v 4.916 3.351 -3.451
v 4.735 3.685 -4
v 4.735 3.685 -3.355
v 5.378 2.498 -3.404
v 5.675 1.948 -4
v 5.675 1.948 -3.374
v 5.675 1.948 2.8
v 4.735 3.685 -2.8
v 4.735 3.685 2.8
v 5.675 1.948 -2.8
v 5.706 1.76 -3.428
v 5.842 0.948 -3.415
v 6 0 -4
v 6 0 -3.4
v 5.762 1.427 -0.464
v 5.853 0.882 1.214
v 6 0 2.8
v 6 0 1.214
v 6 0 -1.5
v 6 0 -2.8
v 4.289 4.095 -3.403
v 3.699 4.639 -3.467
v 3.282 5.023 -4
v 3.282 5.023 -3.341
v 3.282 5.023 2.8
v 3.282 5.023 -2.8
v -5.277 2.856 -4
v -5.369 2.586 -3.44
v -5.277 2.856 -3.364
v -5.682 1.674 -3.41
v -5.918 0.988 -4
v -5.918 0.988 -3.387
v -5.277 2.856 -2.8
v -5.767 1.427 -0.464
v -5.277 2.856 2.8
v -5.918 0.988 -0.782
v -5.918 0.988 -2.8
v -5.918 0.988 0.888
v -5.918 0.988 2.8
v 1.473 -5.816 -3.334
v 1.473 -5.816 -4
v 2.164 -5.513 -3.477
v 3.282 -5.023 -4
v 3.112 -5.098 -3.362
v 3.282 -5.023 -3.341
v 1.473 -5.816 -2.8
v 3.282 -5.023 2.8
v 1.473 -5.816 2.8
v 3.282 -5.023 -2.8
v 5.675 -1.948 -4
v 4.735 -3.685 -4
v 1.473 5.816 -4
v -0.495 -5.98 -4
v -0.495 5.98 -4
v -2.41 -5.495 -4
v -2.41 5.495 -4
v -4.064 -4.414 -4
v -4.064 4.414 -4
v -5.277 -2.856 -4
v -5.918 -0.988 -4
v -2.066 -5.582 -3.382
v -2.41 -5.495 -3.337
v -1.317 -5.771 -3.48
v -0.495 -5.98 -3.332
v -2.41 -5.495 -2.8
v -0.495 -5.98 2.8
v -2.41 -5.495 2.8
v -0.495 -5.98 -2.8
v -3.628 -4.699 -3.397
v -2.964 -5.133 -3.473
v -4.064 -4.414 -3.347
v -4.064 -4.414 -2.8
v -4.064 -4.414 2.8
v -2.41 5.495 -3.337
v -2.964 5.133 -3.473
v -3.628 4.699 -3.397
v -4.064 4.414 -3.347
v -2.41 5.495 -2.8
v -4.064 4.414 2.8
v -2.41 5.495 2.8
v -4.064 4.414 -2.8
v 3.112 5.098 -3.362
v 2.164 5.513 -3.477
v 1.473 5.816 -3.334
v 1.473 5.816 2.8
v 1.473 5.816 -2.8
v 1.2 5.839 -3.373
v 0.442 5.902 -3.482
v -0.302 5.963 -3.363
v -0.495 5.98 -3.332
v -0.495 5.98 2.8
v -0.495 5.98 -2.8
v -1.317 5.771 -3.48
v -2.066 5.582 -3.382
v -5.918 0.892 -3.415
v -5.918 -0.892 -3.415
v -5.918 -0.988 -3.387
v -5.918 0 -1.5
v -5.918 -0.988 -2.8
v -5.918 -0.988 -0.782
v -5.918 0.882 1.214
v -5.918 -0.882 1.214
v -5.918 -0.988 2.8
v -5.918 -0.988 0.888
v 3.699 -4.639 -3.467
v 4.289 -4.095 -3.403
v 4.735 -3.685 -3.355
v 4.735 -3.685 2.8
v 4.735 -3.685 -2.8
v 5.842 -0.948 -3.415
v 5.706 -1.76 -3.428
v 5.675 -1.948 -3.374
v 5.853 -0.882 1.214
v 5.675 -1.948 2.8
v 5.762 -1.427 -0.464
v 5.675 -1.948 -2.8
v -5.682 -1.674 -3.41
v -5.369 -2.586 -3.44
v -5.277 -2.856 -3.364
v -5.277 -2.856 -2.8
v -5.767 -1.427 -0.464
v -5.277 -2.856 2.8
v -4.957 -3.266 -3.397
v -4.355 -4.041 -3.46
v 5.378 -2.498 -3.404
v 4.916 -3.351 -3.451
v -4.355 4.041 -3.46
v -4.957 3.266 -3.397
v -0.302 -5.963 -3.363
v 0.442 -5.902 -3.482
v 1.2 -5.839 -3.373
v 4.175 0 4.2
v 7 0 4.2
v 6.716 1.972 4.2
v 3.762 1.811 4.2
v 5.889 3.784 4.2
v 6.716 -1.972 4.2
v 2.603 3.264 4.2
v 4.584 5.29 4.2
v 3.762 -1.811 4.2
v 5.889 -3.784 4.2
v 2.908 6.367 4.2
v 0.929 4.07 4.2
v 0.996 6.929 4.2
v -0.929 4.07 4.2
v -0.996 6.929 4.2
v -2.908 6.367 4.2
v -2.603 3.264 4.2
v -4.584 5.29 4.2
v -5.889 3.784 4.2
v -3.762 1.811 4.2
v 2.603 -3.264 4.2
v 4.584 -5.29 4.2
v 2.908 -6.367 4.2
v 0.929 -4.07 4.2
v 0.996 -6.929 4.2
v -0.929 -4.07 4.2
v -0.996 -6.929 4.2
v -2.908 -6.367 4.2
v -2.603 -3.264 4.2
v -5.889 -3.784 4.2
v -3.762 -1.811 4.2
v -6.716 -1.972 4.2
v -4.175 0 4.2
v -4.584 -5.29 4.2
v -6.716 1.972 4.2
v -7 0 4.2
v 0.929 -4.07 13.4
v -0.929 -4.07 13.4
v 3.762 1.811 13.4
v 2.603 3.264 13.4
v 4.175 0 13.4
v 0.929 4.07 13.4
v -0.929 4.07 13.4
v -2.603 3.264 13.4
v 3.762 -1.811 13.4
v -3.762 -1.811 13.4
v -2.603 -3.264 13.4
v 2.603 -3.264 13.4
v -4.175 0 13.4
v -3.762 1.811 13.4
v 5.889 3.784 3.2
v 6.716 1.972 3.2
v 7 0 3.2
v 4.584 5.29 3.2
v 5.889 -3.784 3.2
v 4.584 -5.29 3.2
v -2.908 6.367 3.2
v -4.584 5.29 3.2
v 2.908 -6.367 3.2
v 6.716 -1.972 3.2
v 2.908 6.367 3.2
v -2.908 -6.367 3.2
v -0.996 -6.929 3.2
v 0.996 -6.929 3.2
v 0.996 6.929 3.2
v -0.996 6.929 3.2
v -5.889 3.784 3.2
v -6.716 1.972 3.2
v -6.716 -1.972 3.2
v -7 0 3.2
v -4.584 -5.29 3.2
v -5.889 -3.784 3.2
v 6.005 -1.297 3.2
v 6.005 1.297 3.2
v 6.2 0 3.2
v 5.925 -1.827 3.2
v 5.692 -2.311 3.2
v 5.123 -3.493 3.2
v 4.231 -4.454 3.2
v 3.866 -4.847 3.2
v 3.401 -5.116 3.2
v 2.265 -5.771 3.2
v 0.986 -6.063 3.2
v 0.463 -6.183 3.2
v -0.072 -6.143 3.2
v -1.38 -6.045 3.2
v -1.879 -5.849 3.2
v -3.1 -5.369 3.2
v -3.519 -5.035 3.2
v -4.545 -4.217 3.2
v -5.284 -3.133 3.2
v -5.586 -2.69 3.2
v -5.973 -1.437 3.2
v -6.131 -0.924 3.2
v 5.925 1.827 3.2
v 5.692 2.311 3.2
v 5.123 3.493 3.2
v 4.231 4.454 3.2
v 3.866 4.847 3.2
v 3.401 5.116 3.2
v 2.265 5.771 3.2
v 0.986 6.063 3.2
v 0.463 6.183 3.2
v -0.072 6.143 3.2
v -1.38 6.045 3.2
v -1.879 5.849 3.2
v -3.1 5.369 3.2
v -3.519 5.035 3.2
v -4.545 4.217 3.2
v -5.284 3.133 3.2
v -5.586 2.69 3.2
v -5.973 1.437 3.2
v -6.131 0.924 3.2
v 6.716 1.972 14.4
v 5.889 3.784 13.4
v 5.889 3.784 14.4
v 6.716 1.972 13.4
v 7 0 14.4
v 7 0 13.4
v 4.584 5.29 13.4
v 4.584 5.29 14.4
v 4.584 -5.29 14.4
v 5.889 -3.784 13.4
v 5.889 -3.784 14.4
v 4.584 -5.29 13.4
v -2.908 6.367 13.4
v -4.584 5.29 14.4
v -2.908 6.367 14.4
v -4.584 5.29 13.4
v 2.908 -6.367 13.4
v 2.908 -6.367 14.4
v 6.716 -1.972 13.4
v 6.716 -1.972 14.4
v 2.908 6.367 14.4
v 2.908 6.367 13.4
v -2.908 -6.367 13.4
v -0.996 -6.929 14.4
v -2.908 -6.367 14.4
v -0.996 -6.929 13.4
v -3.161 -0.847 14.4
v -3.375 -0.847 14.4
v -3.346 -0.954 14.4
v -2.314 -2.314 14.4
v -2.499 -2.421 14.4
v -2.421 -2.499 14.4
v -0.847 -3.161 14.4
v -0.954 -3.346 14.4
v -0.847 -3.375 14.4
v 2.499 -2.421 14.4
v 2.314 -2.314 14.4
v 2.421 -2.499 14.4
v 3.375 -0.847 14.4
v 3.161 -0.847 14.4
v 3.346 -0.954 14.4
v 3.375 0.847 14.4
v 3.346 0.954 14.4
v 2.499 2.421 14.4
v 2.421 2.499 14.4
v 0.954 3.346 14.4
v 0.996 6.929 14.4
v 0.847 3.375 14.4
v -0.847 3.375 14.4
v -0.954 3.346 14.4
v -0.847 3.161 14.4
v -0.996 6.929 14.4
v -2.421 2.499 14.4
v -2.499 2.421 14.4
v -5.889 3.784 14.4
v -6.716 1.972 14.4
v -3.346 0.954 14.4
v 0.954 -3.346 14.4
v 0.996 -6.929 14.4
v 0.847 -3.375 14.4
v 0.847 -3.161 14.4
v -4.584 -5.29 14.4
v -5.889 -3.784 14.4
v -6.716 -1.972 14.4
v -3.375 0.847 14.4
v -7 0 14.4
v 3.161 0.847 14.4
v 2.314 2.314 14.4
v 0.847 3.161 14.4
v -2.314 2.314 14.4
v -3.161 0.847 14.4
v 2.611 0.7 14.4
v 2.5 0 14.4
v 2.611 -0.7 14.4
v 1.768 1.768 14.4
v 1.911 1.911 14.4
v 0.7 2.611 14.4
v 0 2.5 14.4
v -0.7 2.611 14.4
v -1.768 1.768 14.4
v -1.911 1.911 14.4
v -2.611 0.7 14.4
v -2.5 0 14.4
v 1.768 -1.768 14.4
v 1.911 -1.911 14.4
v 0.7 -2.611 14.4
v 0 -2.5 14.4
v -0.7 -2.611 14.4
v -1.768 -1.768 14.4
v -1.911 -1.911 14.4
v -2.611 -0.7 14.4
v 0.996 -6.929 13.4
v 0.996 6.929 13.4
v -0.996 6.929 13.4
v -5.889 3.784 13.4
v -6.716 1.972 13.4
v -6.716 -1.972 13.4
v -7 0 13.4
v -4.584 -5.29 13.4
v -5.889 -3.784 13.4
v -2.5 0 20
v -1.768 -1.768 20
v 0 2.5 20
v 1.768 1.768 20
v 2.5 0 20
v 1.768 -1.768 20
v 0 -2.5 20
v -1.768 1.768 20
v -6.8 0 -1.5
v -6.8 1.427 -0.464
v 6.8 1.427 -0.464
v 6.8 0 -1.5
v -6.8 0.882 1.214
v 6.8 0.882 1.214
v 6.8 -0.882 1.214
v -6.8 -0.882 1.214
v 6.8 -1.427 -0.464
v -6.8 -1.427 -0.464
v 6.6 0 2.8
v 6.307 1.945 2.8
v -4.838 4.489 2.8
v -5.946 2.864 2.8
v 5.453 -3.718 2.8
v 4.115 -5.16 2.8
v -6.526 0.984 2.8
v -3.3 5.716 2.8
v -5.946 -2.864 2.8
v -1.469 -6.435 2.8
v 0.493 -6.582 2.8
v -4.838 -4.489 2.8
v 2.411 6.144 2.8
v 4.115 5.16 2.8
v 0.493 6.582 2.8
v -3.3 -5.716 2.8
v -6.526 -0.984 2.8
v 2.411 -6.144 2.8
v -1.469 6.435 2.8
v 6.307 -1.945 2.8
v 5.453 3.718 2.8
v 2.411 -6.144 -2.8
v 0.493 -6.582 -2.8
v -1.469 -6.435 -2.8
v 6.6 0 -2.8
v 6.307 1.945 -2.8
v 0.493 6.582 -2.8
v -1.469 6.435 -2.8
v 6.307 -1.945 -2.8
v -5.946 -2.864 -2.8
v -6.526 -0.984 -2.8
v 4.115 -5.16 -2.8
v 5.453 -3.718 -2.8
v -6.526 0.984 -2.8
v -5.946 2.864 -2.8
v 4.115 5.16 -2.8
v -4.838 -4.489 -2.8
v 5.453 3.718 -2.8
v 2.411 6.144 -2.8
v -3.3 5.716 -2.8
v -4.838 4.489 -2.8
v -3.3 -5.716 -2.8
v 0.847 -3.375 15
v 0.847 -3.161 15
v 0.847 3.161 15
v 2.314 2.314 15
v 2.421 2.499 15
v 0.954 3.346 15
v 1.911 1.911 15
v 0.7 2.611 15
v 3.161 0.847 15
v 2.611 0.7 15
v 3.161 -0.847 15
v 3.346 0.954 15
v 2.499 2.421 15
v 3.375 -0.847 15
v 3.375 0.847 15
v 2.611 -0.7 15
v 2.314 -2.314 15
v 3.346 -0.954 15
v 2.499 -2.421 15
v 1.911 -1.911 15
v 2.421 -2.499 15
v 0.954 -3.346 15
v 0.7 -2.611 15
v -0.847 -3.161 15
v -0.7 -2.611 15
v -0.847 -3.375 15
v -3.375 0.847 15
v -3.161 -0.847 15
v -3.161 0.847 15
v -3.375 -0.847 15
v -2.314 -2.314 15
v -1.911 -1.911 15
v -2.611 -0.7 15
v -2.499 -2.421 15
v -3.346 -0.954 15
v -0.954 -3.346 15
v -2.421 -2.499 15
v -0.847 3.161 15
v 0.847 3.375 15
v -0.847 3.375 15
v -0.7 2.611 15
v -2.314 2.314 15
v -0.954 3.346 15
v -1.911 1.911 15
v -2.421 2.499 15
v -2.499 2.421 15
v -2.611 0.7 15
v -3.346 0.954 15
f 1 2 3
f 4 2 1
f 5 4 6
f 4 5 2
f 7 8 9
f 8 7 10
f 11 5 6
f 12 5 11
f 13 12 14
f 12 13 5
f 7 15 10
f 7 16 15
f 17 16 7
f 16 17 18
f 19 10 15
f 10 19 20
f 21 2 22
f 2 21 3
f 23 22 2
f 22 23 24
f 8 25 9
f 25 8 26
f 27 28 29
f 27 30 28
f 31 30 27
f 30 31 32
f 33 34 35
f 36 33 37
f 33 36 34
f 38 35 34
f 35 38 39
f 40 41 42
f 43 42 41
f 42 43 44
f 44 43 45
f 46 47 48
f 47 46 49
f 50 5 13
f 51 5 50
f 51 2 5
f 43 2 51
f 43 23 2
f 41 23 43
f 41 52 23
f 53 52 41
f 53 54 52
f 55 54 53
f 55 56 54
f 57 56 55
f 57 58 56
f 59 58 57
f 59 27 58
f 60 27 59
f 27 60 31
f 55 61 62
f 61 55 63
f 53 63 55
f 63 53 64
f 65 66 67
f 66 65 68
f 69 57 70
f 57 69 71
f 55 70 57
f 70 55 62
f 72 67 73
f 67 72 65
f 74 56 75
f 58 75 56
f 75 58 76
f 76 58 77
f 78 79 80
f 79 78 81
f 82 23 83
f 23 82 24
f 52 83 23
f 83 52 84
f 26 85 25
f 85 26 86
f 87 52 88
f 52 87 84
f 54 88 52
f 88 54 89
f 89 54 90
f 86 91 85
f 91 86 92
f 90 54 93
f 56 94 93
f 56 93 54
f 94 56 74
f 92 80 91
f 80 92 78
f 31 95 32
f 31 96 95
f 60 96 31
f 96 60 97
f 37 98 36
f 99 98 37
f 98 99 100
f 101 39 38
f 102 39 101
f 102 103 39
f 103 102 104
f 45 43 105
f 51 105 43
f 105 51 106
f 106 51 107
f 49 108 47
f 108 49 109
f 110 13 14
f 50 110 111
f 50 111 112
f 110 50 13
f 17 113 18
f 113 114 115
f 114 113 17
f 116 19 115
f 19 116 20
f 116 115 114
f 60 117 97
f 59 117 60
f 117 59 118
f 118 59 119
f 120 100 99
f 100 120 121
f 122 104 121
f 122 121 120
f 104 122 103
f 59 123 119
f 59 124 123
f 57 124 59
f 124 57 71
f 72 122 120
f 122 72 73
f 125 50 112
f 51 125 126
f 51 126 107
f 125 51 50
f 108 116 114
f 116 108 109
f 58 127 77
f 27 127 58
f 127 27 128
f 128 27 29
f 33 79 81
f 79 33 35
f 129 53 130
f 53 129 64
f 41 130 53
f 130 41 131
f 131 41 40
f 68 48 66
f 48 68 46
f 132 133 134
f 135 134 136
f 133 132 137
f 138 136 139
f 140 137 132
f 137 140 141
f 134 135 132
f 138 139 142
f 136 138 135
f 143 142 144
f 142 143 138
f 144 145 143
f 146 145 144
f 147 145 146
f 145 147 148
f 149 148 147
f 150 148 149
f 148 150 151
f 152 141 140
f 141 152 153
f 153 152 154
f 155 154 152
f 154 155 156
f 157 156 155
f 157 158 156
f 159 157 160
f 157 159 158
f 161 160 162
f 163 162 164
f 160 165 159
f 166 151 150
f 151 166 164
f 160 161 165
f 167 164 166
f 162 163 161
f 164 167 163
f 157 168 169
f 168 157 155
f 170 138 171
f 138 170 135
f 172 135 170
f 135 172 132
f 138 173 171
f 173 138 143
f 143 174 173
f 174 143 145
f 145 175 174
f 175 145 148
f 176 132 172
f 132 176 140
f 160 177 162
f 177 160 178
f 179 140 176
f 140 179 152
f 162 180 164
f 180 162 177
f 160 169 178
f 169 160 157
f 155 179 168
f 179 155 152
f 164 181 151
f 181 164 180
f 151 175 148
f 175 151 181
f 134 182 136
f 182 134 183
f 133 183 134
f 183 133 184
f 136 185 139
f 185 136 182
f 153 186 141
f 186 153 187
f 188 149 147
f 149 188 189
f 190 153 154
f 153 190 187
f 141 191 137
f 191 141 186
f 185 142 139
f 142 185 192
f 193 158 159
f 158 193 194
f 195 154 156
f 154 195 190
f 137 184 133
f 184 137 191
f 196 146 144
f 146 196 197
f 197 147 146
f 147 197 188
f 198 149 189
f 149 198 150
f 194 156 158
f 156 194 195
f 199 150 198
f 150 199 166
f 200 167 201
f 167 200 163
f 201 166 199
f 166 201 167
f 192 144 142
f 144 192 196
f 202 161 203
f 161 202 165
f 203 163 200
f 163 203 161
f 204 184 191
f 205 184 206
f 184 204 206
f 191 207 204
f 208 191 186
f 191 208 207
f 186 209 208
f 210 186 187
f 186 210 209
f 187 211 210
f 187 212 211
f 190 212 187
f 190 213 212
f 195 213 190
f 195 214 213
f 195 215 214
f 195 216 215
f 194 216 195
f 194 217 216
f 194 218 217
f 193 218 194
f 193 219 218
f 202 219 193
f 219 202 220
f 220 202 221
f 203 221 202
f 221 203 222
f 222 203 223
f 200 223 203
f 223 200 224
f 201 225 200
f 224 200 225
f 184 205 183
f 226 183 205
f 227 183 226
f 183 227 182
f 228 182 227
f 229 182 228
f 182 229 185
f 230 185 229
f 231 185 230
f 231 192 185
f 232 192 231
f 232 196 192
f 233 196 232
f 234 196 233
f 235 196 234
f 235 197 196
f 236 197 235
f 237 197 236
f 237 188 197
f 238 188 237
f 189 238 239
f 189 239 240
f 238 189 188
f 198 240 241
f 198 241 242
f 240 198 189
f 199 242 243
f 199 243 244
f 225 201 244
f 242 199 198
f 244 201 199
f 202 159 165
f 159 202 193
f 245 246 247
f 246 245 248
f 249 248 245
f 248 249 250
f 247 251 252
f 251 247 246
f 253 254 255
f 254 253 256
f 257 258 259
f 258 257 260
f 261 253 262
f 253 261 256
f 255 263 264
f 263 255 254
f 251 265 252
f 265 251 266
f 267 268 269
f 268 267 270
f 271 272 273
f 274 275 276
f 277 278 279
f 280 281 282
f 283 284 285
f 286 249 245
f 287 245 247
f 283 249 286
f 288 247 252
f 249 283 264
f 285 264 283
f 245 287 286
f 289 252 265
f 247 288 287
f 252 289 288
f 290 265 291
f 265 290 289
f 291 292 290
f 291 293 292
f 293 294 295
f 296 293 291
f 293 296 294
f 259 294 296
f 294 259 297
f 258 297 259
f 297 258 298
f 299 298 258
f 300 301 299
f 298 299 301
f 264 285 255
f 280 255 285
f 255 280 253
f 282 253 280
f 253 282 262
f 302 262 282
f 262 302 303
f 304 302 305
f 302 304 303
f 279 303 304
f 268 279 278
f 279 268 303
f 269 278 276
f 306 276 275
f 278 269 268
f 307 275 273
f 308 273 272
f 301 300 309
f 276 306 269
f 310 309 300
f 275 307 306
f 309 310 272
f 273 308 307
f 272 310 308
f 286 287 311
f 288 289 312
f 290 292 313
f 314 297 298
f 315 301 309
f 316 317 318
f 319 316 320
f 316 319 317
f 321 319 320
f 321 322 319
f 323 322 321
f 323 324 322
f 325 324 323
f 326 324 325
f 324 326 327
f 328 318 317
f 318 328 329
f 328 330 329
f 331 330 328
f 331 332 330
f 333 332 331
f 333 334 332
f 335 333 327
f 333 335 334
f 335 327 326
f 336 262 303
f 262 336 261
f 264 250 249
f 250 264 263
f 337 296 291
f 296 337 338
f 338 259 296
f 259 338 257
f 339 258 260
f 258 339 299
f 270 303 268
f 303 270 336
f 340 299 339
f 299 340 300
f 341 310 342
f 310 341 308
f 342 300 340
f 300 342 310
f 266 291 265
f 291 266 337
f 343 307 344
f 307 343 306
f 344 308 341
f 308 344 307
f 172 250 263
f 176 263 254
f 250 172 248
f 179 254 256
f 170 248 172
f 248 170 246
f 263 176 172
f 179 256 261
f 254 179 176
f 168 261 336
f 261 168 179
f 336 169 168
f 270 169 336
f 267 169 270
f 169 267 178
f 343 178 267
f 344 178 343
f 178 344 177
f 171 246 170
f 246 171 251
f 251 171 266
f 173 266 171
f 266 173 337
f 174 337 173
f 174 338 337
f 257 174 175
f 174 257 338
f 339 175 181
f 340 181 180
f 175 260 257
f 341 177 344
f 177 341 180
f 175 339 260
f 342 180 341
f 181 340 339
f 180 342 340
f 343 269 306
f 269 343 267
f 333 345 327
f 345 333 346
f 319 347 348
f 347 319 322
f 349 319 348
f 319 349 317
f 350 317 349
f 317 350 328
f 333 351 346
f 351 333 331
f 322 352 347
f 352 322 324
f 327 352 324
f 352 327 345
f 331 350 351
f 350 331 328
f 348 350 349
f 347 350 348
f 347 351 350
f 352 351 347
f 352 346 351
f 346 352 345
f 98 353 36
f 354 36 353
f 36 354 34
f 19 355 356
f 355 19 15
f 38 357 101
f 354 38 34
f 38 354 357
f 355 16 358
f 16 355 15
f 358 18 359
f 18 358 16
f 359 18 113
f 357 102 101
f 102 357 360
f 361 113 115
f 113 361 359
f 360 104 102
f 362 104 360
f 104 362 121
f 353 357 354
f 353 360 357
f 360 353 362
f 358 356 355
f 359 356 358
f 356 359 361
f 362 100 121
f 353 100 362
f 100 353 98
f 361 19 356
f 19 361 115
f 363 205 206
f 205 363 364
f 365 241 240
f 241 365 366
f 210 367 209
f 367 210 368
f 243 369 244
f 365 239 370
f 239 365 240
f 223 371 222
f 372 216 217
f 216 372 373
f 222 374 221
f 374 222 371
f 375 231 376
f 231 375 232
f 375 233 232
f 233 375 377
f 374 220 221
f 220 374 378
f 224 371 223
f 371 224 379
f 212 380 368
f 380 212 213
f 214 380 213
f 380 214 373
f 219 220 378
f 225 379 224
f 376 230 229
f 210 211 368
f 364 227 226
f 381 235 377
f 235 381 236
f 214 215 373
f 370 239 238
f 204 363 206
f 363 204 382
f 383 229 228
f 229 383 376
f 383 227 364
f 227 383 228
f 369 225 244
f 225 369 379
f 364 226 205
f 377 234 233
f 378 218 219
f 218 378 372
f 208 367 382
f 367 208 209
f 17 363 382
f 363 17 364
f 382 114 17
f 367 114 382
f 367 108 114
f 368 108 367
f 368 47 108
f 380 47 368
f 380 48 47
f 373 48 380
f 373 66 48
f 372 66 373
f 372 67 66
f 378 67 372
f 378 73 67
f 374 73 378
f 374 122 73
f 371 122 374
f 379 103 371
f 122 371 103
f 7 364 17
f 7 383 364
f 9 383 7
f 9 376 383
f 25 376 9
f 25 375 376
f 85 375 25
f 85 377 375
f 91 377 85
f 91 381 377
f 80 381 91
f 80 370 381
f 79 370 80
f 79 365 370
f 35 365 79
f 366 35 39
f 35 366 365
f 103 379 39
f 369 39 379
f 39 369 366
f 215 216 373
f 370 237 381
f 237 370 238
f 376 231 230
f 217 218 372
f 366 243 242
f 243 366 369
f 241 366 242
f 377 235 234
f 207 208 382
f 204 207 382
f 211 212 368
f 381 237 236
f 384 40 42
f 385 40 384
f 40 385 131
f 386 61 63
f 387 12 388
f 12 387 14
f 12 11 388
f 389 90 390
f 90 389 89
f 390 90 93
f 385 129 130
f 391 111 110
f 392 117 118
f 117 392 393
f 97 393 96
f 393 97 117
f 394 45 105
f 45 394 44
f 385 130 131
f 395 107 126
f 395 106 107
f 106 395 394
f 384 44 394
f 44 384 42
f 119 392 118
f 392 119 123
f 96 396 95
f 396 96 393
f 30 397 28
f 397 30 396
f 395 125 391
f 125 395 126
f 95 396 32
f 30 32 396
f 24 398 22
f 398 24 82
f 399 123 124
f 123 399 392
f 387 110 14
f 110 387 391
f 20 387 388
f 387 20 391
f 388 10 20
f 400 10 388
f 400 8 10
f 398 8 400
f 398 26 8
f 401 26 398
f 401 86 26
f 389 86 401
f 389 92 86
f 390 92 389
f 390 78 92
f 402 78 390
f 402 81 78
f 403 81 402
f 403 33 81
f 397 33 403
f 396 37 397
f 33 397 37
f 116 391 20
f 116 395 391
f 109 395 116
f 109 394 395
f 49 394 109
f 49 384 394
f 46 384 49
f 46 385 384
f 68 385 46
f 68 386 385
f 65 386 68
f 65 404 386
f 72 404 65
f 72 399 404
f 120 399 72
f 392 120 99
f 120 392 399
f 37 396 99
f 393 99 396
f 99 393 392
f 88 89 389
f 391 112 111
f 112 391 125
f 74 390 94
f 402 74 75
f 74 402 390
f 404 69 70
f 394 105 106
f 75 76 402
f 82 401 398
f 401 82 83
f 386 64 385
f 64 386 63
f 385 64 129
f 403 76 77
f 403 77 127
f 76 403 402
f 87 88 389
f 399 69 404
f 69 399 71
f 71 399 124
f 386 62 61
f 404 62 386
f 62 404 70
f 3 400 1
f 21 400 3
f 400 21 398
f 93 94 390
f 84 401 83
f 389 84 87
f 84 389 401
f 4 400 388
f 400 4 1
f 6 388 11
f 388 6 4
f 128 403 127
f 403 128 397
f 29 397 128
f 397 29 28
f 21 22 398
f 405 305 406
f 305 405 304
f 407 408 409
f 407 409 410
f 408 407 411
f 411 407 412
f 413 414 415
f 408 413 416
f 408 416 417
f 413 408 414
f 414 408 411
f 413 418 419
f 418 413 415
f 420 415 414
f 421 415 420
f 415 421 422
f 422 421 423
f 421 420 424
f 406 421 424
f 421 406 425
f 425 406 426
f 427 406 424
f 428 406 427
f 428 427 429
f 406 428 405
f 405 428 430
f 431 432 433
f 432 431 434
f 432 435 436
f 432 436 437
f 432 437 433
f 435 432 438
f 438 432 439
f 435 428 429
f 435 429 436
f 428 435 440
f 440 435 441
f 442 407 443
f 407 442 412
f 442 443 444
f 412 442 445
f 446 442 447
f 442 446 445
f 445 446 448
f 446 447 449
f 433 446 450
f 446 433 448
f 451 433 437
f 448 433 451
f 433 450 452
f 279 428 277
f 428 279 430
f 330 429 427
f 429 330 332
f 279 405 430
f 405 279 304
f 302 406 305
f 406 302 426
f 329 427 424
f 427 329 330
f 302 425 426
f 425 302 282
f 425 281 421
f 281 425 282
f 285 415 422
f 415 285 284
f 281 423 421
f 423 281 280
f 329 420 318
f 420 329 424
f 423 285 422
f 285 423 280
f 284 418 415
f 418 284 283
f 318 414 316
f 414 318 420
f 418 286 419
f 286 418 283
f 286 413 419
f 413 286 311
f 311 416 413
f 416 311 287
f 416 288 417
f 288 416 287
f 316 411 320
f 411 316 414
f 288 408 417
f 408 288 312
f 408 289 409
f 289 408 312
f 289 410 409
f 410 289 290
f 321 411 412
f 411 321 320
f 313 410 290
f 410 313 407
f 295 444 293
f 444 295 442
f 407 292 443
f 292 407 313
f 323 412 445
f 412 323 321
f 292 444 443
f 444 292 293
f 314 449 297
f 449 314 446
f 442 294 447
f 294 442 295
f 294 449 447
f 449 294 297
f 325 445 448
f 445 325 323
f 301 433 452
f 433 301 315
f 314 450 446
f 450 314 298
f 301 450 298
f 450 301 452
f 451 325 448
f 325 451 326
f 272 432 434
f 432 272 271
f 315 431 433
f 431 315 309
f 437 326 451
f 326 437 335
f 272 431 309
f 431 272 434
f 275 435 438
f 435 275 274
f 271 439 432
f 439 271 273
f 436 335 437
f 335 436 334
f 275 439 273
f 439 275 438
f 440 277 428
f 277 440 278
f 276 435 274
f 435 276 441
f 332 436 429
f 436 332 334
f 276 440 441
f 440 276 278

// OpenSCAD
// Parameters
tooth_count = 12; //[6:24:1]
pitch_diameter_mm = 7.15; //[3.6:14.3:0.01]
pulley_width_mm = 10; //[5:20:1]
bore_diameter_mm = 5; //[2.5:10:0.1]
hub_diameter_mm = 12; //[6:24:0.1]
hub_length_mm = 8; //[4:16:0.5]
flange_diameter_mm = 14; //[7:28:0.1]
flange_thickness_mm = 1; //[0.5:3:0.1]
set_screw_count = 1; //[0:2:1]
set_screw_hole_diameter_mm = 3; //[2:5:0.1]
set_screw_height_from_base_mm = 4; //[1:12:0.5]
tooth_depth_mm = 0.764; //[0.38:1.53:0.001]
tooth_width_mm = 1.494; //[0.75:3:0.001]
tooth_relief_scale_mm = 0.2; //[0:0.6:0.01]
tooth_outer_radius_offset_mm = 0.6; //[0.2:1.5:0.01]
overlap_mm = 0.8; //[0.5:2:0.1]
chamfer_mm = 0.6; //[0:2:0.1]

// Pulley - complete geometry
module pulley() {
  color("Silver") {
    // Hub
    translate([0, 0, 0])
      cylinder(h=hub_length_mm, r=hub_diameter_mm/2, center=true);

    // Toothed Outer Profile
    translate([0, 0, hub_length_mm/2 + flange_thickness_mm + pulley_width_mm/2 - overlap_mm])
      cylinder(h=pulley_width_mm, r=pitch_diameter_mm/2 + tooth_outer_radius_offset_mm, center=true);

    // Belt Flanges
    translate([0, 0, hub_length_mm/2 + flange_thickness_mm/2 - overlap_mm])
      cylinder(h=flange_thickness_mm, r=flange_diameter_mm/2, center=true);
    translate([0, 0, hub_length_mm/2 + flange_thickness_mm + pulley_width_mm + flange_thickness_mm/2 - 2*overlap_mm])
      cylinder(h=flange_thickness_mm, r=flange_diameter_mm/2, center=true);

    // Center Bore
    translate([0, 0, hub_length_mm/2 + flange_thickness_mm + pulley_width_mm/2 - overlap_mm])
      cylinder(h=hub_length_mm + pulley_width_mm + 2*flange_thickness_mm + 2*overlap_mm, r=bore_diameter_mm/2, center=true);

    // Set Screw Holes
    if (set_screw_count > 0) {
      for (i = [0:set_screw_count-1]) {
        rotate([0, 90, 0])
          translate([0, 0, -hub_length_mm/2 + set_screw_height_from_base_mm])
          rotate([0, 0, i*360/set_screw_count])
          cylinder(h=hub_diameter_mm + 2*overlap_mm, r=set_screw_hole_diameter_mm/2, center=true);
      }
    }

    // Chamfers
    translate([0, 0, hub_length_mm/2 - chamfer_mm])
      cylinder(h=2*chamfer_mm, r1=hub_diameter_mm/2 + chamfer_mm, r2=hub_diameter_mm/2 - chamfer_mm, center=true);
    translate([0, 0, -hub_length_mm/2 + chamfer_mm])
      cylinder(h=2*chamfer_mm, r1=hub_diameter_mm/2 - chamfer_mm, r2=hub_diameter_mm/2 + chamfer_mm, center=true);
  }
}

// Printed Pulley Teeth From Profile
module printed_pulley_teeth_from_profile() {
  color("Gray") {
    translate([0, 0, hub_length_mm/2 + flange_thickness_mm + pulley_width_mm/2 - overlap_mm])
      for (i = [0:tooth_count-1]) {
        rotate([0, 0, i*360/tooth_count])
          translate([0, -(pitch_diameter_mm/2 + tooth_outer_radius_offset_mm - tooth_depth_mm/2 - overlap_mm), 0])
          cube([tooth_width_mm + tooth_relief_scale_mm, tooth_depth_mm, pulley_width_mm + 2*overlap_mm], center=true);
      }
  }
}

// Printed Pulley GT2 Teeth
module printed_pulley_GT2_teeth() {
  color("DarkGray") {
    translate([0, 0, hub_length_mm/2 + flange_thickness_mm + pulley_width_mm/2 - overlap_mm])
      for (i = [0:tooth_count-1]) {
        rotate([0, 0, i*360/tooth_count])
          translate([0, -(pitch_diameter_mm/2 + tooth_outer_radius_offset_mm - tooth_depth_mm/2 - overlap_mm), 0])
          cube([tooth_width_mm + tooth_relief_scale_mm, tooth_depth_mm, pulley_width_mm + 2*overlap_mm], center=true);
      }
  }
}

// Printed Pulley Teeth
module printed_pulley_teeth() {
  color("LightGray") {
    translate([0, 0, hub_length_mm/2 + flange_thickness_mm + pulley_width_mm/2 - overlap_mm])
      for (i = [0:tooth_count-1]) {
        rotate([0, 0, i*360/tooth_count])
          translate([0, -(pitch_diameter_mm/2 + tooth_outer_radius_offset_mm - tooth_depth_mm/2 - overlap_mm), 0])
          cube([tooth_width_mm + tooth_relief_scale_mm, tooth_depth_mm, pulley_width_mm + 2*overlap_mm], center=true);
      }
  }
}

// Assembly
module assembly() {
  pulley();
  printed_pulley_teeth_from_profile();
  printed_pulley_GT2_teeth();
  printed_pulley_teeth();
}

assembly();
